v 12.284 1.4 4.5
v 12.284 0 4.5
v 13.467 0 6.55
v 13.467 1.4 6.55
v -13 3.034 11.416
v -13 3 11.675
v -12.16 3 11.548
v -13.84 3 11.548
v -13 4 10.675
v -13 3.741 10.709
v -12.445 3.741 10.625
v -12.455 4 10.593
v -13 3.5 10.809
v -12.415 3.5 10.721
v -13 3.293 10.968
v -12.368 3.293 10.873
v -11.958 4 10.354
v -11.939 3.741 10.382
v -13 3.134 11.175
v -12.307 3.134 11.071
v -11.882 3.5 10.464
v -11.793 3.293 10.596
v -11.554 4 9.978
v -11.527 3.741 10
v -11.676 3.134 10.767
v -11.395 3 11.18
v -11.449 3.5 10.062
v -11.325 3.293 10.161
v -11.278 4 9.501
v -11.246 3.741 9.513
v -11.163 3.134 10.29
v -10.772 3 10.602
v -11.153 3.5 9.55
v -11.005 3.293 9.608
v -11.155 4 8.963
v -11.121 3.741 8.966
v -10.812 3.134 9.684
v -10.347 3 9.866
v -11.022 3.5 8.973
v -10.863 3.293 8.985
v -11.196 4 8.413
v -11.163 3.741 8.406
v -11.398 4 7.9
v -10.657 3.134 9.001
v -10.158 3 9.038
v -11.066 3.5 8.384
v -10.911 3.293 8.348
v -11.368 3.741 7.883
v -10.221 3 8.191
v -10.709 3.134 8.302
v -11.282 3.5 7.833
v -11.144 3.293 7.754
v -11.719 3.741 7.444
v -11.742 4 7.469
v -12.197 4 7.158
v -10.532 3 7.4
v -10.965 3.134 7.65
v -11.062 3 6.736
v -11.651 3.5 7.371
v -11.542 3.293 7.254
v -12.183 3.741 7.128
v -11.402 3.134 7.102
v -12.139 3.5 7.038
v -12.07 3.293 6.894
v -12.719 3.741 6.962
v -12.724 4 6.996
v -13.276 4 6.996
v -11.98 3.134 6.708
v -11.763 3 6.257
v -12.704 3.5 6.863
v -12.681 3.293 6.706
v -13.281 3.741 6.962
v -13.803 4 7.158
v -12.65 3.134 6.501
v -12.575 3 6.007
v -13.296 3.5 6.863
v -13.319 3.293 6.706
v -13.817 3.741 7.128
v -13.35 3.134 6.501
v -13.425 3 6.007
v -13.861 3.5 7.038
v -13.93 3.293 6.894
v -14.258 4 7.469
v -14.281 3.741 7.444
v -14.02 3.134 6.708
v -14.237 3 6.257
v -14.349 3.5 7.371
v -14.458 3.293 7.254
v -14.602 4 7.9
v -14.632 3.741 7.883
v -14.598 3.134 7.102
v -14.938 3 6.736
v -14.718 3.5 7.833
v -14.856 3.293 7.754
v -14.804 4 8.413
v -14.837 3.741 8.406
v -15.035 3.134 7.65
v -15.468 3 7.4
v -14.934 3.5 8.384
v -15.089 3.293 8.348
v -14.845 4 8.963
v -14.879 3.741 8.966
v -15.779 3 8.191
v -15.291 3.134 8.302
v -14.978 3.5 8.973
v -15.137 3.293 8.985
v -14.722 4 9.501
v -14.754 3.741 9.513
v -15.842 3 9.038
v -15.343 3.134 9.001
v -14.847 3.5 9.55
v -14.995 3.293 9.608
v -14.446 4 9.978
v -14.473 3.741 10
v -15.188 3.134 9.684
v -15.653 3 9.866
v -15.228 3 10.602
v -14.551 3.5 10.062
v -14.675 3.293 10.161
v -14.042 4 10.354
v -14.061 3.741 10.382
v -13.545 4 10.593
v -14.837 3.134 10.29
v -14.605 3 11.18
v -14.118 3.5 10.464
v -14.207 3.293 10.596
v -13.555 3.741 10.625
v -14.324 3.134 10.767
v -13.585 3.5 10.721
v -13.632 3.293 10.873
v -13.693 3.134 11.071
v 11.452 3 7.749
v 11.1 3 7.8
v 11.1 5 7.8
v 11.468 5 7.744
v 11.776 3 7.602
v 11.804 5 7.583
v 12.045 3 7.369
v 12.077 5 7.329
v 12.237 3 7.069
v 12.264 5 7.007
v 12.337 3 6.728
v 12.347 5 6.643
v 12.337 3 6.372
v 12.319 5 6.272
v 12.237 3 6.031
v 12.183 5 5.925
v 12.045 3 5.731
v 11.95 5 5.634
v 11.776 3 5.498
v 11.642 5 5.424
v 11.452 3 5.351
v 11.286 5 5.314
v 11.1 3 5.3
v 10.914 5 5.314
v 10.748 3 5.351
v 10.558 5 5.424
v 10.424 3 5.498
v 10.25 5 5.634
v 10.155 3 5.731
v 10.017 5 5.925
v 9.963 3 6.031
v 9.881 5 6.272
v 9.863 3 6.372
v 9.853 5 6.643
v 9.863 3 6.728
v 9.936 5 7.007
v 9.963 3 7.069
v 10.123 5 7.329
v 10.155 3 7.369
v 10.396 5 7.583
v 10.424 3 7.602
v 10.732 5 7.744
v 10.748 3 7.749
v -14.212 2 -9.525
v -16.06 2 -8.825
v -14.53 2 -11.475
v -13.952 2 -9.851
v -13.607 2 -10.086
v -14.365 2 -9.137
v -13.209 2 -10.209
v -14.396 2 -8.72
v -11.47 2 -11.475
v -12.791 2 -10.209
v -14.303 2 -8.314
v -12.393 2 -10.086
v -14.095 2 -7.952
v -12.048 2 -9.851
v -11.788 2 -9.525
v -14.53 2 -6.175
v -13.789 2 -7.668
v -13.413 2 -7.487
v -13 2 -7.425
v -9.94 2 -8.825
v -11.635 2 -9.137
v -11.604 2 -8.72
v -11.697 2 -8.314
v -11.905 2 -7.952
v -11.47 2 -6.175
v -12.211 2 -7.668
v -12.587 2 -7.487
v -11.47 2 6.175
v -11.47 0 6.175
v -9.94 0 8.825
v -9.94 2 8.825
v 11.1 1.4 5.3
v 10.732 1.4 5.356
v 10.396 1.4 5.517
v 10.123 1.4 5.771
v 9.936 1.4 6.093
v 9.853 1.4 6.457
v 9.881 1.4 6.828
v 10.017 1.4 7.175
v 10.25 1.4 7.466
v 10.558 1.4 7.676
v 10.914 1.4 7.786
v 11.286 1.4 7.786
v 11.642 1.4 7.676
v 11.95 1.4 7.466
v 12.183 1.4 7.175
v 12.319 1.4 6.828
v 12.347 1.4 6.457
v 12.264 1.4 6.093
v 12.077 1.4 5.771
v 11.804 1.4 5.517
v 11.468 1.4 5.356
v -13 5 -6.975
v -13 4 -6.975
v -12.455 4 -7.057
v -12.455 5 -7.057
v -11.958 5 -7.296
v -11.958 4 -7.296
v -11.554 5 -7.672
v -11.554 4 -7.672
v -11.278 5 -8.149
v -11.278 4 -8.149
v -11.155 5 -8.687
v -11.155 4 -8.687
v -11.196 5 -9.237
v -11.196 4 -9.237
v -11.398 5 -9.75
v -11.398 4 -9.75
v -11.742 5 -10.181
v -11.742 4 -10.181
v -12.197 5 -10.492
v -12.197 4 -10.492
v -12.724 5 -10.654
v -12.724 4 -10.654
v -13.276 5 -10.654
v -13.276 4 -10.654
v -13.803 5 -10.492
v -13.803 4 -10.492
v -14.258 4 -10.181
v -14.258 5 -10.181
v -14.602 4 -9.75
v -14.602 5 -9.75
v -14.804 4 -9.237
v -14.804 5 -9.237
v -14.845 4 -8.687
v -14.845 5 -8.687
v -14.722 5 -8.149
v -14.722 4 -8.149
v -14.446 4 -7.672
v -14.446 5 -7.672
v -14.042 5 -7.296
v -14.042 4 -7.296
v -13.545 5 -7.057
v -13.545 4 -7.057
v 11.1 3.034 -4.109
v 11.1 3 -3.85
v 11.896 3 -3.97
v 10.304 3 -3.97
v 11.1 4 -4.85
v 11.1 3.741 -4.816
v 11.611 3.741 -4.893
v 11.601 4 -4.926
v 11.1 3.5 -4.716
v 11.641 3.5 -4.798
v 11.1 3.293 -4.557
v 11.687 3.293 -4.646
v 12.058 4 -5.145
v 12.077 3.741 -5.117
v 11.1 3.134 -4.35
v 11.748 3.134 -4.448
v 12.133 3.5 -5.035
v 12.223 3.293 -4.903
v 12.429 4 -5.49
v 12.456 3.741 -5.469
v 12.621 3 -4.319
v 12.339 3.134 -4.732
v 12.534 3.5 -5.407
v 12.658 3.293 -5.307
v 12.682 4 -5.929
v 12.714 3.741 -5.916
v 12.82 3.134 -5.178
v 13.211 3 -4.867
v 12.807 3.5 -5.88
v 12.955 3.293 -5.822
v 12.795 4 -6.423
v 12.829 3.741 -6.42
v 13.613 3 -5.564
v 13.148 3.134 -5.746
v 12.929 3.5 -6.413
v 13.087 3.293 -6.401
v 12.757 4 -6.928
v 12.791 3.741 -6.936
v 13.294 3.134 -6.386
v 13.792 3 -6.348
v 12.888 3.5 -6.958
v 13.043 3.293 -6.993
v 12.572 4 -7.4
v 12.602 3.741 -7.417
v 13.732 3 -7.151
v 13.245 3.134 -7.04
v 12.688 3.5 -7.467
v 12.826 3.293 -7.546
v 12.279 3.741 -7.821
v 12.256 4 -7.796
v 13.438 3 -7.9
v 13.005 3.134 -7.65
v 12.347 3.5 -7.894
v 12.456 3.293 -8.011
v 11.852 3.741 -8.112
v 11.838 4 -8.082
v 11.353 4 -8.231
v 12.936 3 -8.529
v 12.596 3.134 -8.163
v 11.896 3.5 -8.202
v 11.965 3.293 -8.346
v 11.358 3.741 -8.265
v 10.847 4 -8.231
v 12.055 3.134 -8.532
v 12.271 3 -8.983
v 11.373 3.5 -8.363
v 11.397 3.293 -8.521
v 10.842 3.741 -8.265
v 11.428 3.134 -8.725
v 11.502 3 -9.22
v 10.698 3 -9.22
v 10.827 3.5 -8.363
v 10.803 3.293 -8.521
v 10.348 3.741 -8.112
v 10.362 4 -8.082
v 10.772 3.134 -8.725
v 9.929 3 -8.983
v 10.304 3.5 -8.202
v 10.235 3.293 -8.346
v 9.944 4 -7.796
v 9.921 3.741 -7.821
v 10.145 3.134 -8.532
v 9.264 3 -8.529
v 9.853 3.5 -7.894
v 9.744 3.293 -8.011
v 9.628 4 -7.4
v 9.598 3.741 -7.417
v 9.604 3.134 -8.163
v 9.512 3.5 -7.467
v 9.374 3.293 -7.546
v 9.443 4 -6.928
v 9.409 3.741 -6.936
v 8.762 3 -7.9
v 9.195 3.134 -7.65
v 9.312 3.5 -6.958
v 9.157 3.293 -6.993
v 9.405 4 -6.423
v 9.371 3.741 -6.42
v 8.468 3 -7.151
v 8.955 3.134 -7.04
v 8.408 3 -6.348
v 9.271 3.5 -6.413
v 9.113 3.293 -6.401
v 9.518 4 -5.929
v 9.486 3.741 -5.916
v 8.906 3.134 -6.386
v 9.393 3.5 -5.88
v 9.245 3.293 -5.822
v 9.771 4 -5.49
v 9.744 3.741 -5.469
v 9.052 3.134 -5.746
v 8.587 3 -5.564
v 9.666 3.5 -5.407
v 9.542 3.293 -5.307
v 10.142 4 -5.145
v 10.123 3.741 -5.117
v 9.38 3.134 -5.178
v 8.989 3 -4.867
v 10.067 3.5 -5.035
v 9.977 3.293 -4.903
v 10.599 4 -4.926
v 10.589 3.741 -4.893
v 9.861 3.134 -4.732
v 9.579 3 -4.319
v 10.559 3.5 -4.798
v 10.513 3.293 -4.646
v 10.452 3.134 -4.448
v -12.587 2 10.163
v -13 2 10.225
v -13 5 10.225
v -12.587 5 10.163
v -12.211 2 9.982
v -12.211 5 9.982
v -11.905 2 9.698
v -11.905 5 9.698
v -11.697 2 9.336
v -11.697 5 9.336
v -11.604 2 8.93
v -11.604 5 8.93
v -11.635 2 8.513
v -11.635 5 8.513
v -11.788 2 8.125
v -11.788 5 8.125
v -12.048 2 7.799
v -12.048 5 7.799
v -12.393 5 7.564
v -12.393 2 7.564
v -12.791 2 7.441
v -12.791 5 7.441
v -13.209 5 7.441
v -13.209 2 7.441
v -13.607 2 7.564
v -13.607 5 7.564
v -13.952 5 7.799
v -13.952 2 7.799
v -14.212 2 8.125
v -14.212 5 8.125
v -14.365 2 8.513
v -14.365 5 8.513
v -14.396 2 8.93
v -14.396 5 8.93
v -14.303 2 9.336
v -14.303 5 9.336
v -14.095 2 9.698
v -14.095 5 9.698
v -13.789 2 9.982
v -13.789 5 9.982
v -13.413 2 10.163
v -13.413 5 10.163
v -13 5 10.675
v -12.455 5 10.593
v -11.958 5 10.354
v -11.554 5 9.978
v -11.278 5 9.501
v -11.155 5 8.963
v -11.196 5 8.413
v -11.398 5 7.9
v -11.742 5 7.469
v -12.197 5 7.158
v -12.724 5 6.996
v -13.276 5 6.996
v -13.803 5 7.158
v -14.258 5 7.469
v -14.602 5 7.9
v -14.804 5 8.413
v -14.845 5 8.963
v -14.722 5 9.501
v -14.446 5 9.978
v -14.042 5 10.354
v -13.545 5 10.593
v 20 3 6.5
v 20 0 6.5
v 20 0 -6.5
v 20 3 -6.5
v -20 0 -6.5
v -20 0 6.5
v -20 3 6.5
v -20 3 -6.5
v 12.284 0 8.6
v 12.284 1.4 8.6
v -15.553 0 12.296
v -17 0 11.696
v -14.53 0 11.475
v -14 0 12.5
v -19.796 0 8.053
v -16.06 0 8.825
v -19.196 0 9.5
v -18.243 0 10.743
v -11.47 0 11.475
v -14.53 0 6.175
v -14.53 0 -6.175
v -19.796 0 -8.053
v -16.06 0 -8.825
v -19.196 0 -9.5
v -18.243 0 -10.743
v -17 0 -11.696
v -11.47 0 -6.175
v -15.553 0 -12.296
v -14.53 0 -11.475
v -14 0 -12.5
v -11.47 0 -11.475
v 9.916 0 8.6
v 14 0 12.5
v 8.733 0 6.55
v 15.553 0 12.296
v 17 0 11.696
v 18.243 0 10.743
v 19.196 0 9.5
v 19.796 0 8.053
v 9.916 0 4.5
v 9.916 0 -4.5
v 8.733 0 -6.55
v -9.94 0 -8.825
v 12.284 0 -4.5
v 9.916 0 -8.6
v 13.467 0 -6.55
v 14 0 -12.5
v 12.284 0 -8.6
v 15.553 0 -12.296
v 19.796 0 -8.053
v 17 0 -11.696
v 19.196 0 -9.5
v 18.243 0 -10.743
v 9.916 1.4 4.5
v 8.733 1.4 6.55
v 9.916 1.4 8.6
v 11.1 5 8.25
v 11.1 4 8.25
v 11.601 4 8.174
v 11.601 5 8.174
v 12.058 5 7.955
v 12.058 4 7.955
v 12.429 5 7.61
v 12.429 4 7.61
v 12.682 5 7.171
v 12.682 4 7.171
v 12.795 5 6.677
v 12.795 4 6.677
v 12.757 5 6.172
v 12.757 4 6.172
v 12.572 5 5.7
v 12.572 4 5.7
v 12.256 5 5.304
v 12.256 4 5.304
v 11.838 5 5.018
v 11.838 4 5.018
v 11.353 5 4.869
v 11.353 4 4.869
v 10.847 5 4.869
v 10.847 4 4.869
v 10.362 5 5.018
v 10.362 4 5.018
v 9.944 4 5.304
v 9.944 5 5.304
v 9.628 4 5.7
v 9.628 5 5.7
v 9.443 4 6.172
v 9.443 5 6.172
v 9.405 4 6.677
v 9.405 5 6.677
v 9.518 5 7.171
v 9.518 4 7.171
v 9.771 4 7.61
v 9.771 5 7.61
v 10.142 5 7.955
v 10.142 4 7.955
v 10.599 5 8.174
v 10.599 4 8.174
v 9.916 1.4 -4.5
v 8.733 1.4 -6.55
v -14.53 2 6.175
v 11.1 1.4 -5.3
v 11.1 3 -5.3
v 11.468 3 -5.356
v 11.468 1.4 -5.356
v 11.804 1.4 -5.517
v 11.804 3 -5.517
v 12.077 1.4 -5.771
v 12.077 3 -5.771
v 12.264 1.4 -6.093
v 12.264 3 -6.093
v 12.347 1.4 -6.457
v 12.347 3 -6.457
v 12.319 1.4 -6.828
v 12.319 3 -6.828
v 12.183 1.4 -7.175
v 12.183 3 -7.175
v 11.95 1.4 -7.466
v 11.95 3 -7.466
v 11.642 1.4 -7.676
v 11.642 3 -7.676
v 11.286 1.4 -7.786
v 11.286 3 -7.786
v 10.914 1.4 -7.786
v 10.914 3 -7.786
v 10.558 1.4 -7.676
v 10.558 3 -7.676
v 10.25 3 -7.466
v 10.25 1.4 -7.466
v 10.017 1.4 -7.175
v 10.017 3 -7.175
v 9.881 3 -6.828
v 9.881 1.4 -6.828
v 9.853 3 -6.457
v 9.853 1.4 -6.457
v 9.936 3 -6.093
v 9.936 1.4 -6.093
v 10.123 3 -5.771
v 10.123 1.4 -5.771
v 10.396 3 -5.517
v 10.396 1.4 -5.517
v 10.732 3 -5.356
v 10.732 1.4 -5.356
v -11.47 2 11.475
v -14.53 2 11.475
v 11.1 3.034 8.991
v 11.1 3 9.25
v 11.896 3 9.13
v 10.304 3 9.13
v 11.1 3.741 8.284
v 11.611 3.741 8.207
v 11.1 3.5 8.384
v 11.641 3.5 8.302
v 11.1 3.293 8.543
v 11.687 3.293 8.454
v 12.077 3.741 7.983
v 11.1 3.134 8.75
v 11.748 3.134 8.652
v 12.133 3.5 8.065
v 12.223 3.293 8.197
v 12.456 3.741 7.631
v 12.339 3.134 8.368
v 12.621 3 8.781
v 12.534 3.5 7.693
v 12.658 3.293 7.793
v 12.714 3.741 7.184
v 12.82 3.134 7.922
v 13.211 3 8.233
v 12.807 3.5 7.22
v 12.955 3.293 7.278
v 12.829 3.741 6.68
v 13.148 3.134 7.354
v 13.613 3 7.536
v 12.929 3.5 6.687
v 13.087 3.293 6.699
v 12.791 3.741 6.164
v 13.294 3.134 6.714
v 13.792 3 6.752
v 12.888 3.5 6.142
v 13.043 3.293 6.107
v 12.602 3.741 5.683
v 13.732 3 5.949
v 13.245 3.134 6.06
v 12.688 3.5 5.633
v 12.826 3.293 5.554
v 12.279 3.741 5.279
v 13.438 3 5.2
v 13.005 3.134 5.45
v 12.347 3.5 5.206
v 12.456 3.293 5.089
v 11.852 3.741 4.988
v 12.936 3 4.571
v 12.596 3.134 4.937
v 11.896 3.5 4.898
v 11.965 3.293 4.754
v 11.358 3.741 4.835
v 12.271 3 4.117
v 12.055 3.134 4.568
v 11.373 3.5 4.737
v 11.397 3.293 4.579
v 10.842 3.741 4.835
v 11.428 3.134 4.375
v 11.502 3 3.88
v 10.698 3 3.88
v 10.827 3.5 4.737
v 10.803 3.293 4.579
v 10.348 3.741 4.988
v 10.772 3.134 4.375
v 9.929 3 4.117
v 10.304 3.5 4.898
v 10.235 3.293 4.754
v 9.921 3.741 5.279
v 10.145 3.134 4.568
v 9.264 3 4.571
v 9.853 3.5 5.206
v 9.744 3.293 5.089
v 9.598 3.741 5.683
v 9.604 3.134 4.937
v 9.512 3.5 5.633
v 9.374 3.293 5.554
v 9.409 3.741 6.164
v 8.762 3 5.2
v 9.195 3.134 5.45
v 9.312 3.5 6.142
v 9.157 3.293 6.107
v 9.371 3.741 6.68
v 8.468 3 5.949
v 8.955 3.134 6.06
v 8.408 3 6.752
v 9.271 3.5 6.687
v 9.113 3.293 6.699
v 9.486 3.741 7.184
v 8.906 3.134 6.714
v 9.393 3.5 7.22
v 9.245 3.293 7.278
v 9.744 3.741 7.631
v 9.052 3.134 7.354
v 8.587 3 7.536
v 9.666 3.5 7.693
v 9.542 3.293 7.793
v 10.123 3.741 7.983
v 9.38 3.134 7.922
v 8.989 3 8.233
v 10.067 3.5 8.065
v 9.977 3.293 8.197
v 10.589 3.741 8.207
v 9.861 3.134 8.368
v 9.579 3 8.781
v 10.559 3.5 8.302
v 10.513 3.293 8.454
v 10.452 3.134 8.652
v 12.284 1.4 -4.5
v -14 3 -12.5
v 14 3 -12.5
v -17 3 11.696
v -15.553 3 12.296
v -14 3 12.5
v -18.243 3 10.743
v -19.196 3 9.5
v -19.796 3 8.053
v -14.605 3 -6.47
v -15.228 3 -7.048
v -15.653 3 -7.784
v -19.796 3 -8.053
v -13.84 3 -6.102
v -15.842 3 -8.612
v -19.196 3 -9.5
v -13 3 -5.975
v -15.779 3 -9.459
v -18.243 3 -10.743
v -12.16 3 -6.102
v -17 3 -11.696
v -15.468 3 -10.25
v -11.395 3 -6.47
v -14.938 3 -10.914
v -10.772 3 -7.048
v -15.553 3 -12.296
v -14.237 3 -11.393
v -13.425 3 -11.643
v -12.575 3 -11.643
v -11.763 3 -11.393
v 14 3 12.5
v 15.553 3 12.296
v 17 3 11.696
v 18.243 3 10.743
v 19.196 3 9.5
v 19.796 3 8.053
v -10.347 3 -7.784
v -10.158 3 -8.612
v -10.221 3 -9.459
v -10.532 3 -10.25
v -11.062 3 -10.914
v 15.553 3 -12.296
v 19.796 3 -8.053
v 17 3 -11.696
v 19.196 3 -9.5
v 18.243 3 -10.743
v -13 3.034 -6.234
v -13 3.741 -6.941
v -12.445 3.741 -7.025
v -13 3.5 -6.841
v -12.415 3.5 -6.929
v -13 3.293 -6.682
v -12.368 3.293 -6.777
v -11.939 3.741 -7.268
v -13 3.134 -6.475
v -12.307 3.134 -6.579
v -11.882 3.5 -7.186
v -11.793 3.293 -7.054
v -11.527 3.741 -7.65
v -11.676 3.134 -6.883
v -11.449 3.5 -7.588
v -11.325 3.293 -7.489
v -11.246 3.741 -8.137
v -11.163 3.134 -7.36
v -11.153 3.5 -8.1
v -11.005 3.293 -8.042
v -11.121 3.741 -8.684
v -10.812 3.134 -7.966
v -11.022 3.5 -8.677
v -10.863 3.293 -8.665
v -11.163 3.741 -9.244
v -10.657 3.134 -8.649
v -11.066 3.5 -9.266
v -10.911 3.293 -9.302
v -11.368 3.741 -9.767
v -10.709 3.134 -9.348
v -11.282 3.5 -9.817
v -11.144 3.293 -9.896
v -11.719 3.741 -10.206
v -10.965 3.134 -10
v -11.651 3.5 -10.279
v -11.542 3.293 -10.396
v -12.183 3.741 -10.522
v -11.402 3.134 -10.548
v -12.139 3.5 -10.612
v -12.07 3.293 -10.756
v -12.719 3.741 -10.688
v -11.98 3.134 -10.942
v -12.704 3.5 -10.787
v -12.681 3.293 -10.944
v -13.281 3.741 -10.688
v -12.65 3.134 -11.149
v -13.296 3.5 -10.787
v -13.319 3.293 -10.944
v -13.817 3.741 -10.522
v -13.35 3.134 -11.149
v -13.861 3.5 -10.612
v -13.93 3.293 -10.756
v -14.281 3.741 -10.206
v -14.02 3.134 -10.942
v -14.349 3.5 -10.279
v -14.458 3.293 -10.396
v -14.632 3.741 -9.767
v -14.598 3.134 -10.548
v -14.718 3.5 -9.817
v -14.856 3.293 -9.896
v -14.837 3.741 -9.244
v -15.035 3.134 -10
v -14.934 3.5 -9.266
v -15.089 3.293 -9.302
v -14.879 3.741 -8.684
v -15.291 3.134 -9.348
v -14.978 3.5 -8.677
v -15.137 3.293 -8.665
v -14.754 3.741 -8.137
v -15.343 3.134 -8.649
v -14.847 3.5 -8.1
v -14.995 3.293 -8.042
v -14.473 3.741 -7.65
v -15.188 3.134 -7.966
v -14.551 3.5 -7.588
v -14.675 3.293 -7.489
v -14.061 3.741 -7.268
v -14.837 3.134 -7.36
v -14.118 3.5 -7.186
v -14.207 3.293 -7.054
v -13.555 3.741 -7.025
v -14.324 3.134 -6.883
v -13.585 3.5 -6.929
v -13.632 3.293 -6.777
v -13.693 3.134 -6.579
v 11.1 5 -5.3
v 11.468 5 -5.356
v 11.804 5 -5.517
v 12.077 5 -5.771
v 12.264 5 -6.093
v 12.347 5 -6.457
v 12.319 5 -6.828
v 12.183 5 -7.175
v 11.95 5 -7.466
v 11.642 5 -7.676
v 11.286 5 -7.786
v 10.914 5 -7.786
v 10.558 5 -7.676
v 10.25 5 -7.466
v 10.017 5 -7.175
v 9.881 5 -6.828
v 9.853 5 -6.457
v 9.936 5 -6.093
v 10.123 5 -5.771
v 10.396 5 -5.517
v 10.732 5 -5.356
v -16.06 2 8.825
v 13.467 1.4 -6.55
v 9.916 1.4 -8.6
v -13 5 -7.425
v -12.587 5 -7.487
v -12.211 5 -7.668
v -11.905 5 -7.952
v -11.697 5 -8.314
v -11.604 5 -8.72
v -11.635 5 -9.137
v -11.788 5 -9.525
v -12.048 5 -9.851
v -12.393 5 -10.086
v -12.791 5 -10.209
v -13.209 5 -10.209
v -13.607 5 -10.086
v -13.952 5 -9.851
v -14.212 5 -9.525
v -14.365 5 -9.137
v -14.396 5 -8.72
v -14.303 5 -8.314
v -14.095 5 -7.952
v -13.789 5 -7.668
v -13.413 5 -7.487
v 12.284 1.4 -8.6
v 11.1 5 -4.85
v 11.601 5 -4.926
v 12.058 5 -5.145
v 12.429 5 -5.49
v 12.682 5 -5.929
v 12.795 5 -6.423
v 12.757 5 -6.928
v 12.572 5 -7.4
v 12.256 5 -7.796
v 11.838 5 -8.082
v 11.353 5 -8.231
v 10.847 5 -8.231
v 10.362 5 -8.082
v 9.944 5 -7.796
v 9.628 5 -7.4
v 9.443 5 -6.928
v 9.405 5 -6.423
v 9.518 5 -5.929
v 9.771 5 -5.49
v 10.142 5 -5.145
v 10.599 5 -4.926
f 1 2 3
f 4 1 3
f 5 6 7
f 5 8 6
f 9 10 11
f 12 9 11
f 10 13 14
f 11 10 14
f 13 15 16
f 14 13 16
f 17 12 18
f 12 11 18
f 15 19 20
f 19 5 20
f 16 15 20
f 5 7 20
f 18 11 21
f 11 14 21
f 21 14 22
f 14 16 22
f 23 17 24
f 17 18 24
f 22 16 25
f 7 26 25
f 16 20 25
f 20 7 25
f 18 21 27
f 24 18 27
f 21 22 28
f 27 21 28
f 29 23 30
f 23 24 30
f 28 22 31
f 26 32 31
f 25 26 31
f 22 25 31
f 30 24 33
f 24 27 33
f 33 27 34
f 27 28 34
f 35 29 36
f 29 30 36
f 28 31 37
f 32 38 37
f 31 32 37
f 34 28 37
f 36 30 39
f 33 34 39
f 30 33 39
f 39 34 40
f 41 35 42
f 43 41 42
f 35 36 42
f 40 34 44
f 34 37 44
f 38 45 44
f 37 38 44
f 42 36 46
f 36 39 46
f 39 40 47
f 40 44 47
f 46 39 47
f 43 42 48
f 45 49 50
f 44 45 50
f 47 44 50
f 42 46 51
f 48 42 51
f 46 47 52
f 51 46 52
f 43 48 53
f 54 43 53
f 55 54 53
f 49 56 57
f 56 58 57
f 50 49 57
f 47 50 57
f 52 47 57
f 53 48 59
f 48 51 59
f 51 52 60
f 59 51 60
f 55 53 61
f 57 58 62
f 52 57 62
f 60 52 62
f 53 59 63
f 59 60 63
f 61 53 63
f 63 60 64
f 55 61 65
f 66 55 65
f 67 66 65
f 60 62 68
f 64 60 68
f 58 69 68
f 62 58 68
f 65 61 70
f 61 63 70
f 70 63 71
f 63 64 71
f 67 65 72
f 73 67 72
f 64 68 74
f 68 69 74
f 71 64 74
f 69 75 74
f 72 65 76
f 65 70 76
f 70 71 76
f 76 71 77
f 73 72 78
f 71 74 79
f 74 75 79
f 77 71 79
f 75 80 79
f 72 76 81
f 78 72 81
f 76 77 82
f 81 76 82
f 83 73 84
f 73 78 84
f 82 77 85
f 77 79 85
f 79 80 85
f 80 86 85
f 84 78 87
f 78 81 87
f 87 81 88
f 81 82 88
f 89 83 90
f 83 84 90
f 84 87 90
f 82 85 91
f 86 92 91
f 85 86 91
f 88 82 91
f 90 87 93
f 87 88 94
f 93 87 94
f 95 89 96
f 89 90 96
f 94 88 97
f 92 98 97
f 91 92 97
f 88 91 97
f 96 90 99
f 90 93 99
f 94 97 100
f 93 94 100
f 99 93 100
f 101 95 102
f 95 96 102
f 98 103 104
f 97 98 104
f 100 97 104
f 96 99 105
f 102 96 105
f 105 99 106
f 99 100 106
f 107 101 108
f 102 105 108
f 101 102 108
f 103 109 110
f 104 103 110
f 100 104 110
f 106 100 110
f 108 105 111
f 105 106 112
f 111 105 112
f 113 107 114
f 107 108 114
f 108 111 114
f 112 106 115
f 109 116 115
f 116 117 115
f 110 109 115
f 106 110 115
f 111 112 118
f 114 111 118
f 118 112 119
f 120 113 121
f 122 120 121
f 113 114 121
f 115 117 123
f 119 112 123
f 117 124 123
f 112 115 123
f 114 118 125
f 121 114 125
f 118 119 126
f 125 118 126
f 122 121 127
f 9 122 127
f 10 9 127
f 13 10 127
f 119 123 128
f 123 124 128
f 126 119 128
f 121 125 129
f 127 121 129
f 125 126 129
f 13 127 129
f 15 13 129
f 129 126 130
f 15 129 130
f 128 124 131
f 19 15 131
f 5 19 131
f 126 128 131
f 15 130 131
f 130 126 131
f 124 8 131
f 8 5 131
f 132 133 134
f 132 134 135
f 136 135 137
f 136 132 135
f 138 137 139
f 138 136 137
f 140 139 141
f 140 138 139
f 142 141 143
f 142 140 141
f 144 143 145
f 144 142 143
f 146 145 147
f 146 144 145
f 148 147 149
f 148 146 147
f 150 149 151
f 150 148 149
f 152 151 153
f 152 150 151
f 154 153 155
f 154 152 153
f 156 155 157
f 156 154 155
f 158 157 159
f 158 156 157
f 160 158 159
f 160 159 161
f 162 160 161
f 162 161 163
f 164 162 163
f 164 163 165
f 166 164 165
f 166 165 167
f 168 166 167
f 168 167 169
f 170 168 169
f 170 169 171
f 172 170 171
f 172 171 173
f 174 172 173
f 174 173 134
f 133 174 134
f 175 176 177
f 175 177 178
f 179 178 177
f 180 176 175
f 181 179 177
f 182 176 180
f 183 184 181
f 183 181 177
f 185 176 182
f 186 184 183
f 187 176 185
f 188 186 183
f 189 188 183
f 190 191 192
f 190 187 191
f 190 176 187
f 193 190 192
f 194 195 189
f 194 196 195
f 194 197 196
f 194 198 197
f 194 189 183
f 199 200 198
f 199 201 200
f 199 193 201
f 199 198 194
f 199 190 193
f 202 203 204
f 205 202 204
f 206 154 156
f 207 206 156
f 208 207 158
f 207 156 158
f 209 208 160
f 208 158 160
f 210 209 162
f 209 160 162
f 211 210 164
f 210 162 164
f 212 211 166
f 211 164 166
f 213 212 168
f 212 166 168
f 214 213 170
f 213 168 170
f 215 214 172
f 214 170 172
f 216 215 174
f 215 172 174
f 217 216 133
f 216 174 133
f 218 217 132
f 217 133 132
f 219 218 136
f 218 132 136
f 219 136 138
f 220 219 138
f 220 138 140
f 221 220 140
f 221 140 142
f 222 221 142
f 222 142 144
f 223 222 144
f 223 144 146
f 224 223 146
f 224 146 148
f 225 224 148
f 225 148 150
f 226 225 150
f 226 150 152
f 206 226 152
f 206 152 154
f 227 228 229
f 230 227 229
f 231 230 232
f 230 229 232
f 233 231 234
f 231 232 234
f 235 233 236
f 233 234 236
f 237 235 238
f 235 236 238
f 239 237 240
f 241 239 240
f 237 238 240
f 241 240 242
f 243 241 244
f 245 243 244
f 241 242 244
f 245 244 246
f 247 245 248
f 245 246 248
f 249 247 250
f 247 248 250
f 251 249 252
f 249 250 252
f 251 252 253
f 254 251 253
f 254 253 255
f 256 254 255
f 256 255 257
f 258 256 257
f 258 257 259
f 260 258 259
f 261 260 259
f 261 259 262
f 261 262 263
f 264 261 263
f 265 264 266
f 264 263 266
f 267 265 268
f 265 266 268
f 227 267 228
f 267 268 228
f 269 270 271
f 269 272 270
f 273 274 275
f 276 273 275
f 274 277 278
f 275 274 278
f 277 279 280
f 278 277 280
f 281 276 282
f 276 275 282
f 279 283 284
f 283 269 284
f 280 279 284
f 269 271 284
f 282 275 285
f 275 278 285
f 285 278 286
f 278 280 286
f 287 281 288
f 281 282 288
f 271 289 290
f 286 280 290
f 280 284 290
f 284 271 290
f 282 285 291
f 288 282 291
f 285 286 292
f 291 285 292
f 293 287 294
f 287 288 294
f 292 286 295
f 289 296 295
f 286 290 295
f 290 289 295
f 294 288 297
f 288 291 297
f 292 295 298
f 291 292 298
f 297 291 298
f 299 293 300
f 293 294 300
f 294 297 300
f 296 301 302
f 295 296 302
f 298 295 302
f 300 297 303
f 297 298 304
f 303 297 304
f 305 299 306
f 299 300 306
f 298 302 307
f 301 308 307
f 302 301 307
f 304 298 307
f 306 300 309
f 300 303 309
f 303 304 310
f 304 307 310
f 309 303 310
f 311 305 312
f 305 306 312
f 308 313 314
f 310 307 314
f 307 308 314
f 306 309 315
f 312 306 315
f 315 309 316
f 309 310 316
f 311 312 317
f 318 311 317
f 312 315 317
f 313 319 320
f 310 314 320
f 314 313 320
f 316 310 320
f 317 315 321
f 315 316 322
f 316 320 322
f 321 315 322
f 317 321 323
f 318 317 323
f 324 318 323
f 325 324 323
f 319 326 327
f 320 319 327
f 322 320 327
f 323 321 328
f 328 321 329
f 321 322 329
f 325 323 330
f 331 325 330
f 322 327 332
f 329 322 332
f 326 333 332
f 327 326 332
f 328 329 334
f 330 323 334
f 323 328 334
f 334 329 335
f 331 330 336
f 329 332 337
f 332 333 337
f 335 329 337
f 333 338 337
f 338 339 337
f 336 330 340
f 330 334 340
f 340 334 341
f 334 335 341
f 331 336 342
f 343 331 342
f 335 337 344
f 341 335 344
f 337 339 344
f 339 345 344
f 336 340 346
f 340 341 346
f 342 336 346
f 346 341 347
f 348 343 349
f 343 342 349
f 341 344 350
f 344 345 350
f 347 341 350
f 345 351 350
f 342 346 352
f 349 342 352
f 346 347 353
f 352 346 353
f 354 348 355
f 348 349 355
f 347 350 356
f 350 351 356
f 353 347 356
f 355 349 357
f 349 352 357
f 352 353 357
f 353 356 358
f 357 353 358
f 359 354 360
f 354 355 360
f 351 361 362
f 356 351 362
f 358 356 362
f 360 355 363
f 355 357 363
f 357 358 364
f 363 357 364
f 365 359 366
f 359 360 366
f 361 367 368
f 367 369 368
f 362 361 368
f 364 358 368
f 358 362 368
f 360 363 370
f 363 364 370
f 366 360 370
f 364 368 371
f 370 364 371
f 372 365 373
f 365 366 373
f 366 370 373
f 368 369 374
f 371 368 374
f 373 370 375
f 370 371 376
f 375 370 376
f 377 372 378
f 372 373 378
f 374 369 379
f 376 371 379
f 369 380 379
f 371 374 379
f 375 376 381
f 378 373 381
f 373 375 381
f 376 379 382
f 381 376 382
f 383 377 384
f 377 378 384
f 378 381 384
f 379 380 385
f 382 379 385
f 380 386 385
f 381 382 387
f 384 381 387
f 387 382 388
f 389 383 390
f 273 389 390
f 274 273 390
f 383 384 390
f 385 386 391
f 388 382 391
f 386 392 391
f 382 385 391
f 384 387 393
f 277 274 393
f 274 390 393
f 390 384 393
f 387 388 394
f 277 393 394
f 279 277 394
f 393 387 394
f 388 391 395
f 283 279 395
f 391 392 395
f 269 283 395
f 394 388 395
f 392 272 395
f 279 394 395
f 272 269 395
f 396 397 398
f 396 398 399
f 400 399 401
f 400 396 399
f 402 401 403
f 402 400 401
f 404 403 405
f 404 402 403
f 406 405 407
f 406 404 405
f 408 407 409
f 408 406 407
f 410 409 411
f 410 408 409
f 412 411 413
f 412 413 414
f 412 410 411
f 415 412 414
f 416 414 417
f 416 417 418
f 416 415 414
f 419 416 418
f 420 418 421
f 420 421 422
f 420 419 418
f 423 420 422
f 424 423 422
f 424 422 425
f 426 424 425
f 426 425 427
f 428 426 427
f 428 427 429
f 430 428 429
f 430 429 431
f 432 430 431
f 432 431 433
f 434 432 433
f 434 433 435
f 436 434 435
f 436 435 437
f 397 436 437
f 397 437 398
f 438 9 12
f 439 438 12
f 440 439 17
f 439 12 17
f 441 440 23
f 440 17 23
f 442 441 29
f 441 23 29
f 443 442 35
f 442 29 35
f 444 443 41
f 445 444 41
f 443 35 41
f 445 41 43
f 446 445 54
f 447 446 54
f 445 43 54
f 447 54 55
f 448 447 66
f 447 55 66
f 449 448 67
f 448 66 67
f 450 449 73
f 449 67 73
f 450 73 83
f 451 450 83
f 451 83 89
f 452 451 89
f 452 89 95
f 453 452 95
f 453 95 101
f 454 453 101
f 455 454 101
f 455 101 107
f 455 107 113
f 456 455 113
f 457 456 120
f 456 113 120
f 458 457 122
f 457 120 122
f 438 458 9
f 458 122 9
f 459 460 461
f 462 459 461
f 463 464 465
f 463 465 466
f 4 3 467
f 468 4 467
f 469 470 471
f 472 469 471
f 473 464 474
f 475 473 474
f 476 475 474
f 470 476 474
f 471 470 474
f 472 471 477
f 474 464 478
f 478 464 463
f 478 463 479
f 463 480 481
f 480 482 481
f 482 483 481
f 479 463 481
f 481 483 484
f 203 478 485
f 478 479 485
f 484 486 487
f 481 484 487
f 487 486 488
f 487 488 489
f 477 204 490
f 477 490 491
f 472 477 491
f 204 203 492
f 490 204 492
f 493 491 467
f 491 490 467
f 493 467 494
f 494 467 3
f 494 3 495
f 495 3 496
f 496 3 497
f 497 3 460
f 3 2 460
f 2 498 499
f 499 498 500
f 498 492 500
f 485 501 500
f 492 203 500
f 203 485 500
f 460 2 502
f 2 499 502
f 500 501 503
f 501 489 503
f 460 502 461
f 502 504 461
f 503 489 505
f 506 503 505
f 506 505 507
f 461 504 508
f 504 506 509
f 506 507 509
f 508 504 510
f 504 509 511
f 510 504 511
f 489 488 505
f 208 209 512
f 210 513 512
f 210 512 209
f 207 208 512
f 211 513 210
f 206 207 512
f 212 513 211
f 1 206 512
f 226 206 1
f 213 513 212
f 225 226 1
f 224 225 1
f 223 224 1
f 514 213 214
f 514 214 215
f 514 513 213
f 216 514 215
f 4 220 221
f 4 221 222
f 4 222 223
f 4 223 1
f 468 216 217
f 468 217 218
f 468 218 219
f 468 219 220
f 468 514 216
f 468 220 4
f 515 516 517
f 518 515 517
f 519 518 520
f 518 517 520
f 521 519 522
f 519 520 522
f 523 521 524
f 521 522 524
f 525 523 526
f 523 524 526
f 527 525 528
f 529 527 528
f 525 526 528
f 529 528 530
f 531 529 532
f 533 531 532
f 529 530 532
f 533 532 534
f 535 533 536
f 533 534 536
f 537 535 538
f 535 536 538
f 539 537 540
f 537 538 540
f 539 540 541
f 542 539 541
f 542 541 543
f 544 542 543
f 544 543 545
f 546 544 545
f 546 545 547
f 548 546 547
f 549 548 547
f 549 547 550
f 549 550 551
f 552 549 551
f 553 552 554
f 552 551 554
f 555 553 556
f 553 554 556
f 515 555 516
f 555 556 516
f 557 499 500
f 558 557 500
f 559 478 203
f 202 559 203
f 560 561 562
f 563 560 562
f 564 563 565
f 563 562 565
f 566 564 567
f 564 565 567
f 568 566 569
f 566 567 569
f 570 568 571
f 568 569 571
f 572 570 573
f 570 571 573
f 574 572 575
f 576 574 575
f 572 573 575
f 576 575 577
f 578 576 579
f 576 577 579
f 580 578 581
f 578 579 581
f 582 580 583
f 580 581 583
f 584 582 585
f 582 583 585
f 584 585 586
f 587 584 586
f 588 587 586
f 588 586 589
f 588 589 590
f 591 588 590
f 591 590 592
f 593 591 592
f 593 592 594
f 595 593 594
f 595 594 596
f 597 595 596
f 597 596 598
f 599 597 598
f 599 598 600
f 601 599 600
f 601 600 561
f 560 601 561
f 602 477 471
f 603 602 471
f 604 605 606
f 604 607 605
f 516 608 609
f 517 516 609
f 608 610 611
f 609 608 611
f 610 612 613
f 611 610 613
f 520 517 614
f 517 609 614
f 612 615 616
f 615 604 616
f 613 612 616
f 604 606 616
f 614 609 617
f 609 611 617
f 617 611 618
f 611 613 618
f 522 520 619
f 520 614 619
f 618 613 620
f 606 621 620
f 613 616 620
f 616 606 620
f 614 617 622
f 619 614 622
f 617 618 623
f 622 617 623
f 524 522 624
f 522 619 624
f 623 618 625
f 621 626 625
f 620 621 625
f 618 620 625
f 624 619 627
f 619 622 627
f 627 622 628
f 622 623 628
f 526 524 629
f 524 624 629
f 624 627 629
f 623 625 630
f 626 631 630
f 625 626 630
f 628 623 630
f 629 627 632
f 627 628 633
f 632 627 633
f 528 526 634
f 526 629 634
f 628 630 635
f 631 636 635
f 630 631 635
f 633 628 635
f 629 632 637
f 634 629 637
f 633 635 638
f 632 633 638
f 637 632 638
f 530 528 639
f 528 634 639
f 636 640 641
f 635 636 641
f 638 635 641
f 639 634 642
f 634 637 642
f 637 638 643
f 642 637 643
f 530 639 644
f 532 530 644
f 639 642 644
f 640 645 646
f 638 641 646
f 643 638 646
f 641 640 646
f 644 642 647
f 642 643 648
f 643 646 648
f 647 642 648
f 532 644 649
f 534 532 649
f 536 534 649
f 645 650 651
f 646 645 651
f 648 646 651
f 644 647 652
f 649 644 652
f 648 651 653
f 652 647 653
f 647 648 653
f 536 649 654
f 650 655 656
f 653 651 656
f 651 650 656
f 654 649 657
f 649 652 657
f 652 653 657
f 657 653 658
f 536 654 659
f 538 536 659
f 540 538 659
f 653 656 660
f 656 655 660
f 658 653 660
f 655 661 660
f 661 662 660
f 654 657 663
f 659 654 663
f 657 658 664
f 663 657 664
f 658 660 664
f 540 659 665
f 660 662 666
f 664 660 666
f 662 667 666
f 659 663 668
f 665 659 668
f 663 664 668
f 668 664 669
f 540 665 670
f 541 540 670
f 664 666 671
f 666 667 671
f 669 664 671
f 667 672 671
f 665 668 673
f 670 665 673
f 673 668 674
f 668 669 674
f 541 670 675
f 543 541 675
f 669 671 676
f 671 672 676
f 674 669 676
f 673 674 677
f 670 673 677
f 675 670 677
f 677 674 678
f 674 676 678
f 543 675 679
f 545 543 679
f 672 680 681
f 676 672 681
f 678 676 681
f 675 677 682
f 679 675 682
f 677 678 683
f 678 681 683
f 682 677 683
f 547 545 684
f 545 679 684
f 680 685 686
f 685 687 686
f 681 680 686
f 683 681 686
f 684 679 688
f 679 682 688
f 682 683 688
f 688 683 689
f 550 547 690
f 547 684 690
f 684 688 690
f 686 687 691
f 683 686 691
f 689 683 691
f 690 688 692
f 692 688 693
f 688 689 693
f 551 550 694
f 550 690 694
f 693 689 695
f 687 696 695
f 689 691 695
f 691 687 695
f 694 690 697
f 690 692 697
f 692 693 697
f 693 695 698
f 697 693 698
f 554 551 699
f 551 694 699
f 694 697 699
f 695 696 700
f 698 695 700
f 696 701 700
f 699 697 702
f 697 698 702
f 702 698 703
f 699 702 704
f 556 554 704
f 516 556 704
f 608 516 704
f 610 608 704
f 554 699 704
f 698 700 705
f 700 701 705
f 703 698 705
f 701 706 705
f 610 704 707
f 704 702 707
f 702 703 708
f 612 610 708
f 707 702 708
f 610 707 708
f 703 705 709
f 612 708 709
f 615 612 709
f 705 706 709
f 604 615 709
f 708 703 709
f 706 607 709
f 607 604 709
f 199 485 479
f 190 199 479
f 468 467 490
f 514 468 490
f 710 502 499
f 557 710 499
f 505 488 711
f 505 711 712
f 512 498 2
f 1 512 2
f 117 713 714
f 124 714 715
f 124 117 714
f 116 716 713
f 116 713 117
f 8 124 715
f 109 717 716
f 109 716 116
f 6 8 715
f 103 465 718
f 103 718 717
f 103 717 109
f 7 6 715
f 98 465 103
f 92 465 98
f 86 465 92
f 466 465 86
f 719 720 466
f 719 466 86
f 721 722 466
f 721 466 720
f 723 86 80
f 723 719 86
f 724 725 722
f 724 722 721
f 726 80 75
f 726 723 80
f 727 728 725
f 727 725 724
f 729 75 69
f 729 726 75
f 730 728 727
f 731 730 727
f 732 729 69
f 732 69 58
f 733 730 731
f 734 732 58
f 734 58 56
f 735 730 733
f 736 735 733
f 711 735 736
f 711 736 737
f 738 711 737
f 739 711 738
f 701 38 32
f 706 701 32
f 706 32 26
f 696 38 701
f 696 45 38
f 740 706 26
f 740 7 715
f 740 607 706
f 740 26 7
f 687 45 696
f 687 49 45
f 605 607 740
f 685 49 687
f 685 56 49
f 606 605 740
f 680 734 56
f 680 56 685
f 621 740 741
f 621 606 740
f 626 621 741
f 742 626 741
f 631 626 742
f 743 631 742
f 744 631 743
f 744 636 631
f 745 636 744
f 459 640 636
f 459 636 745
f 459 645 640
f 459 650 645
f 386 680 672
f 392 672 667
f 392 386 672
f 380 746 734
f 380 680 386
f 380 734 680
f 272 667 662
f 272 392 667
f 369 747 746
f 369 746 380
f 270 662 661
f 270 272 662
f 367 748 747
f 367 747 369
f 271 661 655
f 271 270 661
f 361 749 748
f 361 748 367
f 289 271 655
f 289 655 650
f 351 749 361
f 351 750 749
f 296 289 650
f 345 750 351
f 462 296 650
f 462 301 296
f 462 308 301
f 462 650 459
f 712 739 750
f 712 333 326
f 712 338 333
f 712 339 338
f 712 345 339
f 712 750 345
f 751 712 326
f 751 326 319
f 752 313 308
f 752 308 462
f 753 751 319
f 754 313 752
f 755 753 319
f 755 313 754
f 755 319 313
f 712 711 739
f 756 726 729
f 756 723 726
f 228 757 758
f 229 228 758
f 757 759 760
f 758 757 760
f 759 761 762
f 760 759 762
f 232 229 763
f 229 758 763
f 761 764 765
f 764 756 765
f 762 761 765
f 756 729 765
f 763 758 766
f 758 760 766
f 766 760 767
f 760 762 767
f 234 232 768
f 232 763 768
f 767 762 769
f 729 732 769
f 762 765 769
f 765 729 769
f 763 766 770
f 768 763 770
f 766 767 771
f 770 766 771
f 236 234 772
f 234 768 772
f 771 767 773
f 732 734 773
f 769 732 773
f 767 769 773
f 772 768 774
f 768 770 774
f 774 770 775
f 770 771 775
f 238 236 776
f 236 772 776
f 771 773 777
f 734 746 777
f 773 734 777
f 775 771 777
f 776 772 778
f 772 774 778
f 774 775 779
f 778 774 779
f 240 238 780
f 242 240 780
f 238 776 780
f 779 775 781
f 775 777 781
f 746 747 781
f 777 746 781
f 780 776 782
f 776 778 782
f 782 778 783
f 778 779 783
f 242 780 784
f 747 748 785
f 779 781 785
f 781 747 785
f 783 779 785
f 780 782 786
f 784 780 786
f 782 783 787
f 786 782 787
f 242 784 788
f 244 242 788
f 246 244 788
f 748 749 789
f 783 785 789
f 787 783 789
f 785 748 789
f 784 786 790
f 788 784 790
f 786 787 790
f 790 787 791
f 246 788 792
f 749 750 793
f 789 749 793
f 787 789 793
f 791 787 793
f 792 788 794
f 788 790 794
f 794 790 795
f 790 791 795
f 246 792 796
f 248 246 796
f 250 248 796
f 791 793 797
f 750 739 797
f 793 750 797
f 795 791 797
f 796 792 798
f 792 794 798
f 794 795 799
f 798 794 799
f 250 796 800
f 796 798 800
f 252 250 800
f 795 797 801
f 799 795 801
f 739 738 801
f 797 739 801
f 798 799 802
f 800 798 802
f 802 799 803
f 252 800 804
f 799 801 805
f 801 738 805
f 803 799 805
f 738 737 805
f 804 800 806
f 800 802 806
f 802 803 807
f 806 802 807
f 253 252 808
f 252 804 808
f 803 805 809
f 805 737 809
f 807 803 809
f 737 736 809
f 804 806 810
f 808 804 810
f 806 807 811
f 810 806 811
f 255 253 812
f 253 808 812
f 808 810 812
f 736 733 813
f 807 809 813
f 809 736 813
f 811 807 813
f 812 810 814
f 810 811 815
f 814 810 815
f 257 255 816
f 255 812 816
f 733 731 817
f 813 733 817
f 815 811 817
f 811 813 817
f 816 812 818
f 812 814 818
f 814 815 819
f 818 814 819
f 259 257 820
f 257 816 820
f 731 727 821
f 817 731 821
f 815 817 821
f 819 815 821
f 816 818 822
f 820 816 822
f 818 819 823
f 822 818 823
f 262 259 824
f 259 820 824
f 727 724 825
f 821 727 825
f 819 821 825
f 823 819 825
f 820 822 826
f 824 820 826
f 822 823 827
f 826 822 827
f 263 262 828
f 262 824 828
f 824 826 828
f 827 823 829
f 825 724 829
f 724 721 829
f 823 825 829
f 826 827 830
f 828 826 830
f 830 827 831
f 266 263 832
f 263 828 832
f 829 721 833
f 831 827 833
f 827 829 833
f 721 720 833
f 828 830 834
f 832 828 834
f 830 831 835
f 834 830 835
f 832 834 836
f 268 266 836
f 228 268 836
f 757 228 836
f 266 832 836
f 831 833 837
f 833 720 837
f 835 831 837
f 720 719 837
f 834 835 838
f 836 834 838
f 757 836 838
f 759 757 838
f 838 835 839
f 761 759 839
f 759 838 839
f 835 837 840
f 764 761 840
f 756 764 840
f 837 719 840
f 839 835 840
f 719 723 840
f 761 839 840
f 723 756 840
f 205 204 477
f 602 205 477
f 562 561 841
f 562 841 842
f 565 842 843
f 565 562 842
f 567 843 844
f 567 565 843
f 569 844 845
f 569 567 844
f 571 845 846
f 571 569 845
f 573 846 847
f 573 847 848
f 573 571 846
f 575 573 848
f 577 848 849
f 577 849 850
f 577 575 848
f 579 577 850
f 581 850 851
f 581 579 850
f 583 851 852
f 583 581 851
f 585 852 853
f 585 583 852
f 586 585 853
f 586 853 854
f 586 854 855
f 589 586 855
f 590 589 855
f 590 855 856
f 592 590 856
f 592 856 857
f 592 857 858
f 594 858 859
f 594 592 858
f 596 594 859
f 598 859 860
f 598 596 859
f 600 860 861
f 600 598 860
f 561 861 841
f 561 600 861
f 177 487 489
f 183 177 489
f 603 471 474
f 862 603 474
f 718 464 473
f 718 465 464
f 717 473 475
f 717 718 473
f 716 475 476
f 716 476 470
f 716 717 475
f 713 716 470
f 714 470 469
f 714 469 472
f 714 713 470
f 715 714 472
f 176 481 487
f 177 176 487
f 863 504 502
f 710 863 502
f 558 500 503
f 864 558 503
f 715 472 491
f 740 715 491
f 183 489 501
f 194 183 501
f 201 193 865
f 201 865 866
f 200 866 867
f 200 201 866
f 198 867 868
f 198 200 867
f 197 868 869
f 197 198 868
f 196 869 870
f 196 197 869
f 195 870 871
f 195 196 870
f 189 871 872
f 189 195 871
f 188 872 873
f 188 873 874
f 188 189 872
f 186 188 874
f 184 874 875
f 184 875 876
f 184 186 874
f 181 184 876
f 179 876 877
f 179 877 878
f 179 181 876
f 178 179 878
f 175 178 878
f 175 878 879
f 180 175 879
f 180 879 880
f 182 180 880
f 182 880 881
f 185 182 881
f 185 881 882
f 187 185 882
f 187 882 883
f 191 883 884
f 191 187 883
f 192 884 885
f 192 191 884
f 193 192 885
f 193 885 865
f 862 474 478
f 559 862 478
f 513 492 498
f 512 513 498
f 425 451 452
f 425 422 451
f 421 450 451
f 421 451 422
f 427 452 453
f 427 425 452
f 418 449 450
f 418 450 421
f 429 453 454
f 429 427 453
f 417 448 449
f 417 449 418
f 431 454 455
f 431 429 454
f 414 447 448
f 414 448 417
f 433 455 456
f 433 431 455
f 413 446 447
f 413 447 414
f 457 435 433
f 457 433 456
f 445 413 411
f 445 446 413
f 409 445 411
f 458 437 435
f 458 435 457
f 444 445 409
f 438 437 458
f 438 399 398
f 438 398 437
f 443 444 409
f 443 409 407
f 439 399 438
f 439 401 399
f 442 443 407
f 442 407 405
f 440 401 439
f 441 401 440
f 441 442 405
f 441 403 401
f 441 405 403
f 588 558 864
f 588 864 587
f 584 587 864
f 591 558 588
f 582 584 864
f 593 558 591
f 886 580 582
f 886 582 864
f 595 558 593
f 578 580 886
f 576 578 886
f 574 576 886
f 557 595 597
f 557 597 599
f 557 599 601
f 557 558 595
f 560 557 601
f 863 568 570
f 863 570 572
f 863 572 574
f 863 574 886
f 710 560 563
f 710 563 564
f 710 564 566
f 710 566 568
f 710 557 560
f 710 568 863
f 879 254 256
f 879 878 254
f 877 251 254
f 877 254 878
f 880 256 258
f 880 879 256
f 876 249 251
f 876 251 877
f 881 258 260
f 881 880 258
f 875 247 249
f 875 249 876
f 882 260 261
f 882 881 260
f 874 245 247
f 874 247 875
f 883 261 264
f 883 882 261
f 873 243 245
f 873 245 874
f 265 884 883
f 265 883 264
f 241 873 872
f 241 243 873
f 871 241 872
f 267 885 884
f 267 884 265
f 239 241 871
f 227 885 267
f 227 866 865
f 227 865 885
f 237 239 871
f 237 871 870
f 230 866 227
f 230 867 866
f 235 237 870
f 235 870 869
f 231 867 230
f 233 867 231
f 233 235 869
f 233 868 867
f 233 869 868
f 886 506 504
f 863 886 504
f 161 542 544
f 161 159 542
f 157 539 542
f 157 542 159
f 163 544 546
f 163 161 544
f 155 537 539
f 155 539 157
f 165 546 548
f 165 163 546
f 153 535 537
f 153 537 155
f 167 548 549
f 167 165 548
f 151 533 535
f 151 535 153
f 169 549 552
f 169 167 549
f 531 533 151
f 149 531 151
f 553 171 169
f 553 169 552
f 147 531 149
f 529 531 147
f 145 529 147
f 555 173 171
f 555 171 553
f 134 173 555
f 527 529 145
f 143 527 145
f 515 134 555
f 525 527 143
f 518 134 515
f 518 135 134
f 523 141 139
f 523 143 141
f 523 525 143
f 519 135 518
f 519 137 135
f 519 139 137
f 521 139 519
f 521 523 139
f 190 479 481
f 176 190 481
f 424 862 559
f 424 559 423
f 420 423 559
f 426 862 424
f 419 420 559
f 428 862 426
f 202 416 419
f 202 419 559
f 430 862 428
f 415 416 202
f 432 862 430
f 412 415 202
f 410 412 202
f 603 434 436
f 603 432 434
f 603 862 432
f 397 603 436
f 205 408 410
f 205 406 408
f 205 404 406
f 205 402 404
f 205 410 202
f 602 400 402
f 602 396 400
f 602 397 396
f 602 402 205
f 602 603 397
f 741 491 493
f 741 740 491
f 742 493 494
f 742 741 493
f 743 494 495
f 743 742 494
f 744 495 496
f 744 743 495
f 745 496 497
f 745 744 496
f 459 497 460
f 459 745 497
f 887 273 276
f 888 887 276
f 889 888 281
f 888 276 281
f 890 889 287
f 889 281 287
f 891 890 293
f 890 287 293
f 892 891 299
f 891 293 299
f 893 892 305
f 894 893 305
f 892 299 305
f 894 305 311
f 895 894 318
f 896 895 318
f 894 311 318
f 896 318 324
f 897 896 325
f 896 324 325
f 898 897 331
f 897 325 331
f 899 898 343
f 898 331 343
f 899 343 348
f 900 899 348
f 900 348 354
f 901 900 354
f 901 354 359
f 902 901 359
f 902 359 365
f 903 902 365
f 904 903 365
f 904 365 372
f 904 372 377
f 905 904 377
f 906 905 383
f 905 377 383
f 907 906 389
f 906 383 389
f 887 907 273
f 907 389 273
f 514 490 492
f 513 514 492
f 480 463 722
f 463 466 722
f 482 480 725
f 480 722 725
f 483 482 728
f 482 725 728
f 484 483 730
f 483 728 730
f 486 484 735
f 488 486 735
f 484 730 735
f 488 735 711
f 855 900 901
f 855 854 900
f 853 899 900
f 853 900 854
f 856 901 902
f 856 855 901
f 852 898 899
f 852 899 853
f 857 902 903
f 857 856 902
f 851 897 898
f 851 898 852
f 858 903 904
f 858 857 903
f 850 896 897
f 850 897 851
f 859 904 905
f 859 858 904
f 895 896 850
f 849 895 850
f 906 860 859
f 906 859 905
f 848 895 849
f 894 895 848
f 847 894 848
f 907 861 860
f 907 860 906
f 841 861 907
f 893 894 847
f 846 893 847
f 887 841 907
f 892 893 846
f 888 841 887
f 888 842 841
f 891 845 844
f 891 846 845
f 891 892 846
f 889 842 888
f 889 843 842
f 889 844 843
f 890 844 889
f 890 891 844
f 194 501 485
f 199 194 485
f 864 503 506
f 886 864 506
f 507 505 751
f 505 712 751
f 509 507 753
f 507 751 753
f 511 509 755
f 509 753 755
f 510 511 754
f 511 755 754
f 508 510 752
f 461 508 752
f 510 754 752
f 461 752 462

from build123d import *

# Parameters (mm, degrees)
SKETCH1_W           = 40
SKETCH1_H           = 25
SKETCH1_R           = 1.4
BOSS_EXTRUDE1_DEPTH = 3
SKETCH2_R           = 1.25
CUT_EXTRUDE1_DEPTH  = 24.774986856
SKETCH4_R           = 1.85
SKETCH4_R_2         = 1.4
SKETCH4_R_3         = 1.7
SKETCH4_R_4         = 1.25
BOSS_EXTRUDE2_DEPTH = 2
FILLET1_R           = 1
CUT_EXTRUDE2_DEPTH  = 2
CUT_EXTRUDE3_DEPTH  = 1.4
FILLET2_R           = 6


with BuildPart() as part:
    # Sketch1 → Boss-Extrude1 (new body)
    with BuildSketch(Plane(origin=(0, 0, 0), x_dir=(1, 0, 0), z_dir=(0, 1, 0))):
        Rectangle(SKETCH1_W, SKETCH1_H)
        with Locations(Location((-13, 8.825, 0), (0, 0, 270))):
            Circle(SKETCH1_R, mode=Mode.SUBTRACT)
        with Locations(Location((-13, -8.825, 0), (0, 0, 270))):
            Circle(SKETCH1_R, mode=Mode.SUBTRACT)
    extrude(amount=BOSS_EXTRUDE1_DEPTH)

    # Sketch2 → Cut-Extrude1 (cut, through all)
    with BuildSketch(Plane(origin=(0, 3, 0), x_dir=(1, 0, 0), z_dir=(0, 1, 0))):
        with Locations(Location((11.1, 6.55, 0), (0, 0, 270))):
            Circle(SKETCH2_R)
        with Locations(Location((11.1, -6.55, 0), (0, 0, 90))):
            Circle(SKETCH2_R)
    extrude(amount=-CUT_EXTRUDE1_DEPTH, mode=Mode.SUBTRACT)

    # Sketch4 → Boss-Extrude2 (add)
    # profile 1 of 4: a face of its own
    with BuildSketch(Plane(origin=(0, 3, 0), x_dir=(1, 0, 0), z_dir=(0, 1, 0))):
        with Locations(Location((-13, 8.825, 0), (0, 0, 270))):
            Circle(SKETCH4_R)
        with Locations(Location((-13, 8.825, 0), (0, 0, 270))):
            Circle(SKETCH4_R_2, mode=Mode.SUBTRACT)
    # profile 2 of 4: a face of its own
    with BuildSketch(Plane(origin=(0, 3, 0), x_dir=(1, 0, 0), z_dir=(0, 1, 0))):
        with Locations(Location((11.1, 6.55, 0), (0, 0, 270))):
            Circle(SKETCH4_R_3)
        with Locations(Location((11.1, 6.55, 0), (0, 0, 270))):
            Circle(SKETCH4_R_4, mode=Mode.SUBTRACT)
    # profile 3 of 4: a face of its own
    with BuildSketch(Plane(origin=(0, 3, 0), x_dir=(1, 0, 0), z_dir=(0, 1, 0))):
        with Locations(Location((11.1, -6.55, 0), (0, 0, 270))):
            Circle(SKETCH4_R_3)
        with Locations(Location((11.1, -6.55, 0), (0, 0, 270))):
            Circle(SKETCH4_R_4, mode=Mode.SUBTRACT)
    # profile 4 of 4: a face of its own
    with BuildSketch(Plane(origin=(0, 3, 0), x_dir=(1, 0, 0), z_dir=(0, 1, 0))):
        with Locations(Location((-13, -8.825, 0), (0, 0, 270))):
            Circle(SKETCH4_R)
        with Locations(Location((-13, -8.825, 0), (0, 0, 270))):
            Circle(SKETCH4_R_2, mode=Mode.SUBTRACT)
    extrude(amount=BOSS_EXTRUDE2_DEPTH)

    # Fillet1
    fillet1_edges = [part.edges().sort_by_distance(p)[0] for p in [
        (-13, 3, -10.675),
        (11.1, 3, -8.25),
        (11.1, 3, 4.85),
        (-13, 3, 6.975),
    ]]
    fillet(fillet1_edges, radius=FILLET1_R)

    # Sketch5 → Cut-Extrude2 (cut)
    with BuildSketch(Plane.XZ):
        Polygon((-11.470021787, 6.175), (-9.940043573, 8.825), (-11.470021787, 11.475), (-14.529978213, 11.475), (-16.059956427, 8.825), (-14.529978213, 6.175), align=None)
        Polygon((-11.470021787, -11.475), (-9.940043573, -8.825), (-11.470021787, -6.175), (-14.529978213, -6.175), (-16.059956427, -8.825), (-14.529978213, -11.475), align=None)
    extrude(amount=-CUT_EXTRUDE2_DEPTH, mode=Mode.SUBTRACT)

    # Sketch6 → Cut-Extrude3 (cut)
    with BuildSketch(Plane.XZ):
        Polygon((12.283568052, 4.5), (13.467136104, 6.55), (12.283568052, 8.6), (9.916431948, 8.6), (8.732863896, 6.55), (9.916431948, 4.5), align=None)
        Polygon((12.283568052, -8.6), (13.467136104, -6.55), (12.283568052, -4.5), (9.916431948, -4.5), (8.732863896, -6.55), (9.916431948, -8.6), align=None)
    extrude(amount=-CUT_EXTRUDE3_DEPTH, mode=Mode.SUBTRACT)

    # Fillet2
    fillet2_edges = [part.edges().sort_by_distance(p)[0] for p in [
        (-20, 1.5, -12.5),
        (20, 1.5, -12.5),
        (20, 1.5, 12.5),
        (-20, 1.5, 12.5),
    ]]
    fillet(fillet2_edges, radius=FILLET2_R)


solid = part.part
